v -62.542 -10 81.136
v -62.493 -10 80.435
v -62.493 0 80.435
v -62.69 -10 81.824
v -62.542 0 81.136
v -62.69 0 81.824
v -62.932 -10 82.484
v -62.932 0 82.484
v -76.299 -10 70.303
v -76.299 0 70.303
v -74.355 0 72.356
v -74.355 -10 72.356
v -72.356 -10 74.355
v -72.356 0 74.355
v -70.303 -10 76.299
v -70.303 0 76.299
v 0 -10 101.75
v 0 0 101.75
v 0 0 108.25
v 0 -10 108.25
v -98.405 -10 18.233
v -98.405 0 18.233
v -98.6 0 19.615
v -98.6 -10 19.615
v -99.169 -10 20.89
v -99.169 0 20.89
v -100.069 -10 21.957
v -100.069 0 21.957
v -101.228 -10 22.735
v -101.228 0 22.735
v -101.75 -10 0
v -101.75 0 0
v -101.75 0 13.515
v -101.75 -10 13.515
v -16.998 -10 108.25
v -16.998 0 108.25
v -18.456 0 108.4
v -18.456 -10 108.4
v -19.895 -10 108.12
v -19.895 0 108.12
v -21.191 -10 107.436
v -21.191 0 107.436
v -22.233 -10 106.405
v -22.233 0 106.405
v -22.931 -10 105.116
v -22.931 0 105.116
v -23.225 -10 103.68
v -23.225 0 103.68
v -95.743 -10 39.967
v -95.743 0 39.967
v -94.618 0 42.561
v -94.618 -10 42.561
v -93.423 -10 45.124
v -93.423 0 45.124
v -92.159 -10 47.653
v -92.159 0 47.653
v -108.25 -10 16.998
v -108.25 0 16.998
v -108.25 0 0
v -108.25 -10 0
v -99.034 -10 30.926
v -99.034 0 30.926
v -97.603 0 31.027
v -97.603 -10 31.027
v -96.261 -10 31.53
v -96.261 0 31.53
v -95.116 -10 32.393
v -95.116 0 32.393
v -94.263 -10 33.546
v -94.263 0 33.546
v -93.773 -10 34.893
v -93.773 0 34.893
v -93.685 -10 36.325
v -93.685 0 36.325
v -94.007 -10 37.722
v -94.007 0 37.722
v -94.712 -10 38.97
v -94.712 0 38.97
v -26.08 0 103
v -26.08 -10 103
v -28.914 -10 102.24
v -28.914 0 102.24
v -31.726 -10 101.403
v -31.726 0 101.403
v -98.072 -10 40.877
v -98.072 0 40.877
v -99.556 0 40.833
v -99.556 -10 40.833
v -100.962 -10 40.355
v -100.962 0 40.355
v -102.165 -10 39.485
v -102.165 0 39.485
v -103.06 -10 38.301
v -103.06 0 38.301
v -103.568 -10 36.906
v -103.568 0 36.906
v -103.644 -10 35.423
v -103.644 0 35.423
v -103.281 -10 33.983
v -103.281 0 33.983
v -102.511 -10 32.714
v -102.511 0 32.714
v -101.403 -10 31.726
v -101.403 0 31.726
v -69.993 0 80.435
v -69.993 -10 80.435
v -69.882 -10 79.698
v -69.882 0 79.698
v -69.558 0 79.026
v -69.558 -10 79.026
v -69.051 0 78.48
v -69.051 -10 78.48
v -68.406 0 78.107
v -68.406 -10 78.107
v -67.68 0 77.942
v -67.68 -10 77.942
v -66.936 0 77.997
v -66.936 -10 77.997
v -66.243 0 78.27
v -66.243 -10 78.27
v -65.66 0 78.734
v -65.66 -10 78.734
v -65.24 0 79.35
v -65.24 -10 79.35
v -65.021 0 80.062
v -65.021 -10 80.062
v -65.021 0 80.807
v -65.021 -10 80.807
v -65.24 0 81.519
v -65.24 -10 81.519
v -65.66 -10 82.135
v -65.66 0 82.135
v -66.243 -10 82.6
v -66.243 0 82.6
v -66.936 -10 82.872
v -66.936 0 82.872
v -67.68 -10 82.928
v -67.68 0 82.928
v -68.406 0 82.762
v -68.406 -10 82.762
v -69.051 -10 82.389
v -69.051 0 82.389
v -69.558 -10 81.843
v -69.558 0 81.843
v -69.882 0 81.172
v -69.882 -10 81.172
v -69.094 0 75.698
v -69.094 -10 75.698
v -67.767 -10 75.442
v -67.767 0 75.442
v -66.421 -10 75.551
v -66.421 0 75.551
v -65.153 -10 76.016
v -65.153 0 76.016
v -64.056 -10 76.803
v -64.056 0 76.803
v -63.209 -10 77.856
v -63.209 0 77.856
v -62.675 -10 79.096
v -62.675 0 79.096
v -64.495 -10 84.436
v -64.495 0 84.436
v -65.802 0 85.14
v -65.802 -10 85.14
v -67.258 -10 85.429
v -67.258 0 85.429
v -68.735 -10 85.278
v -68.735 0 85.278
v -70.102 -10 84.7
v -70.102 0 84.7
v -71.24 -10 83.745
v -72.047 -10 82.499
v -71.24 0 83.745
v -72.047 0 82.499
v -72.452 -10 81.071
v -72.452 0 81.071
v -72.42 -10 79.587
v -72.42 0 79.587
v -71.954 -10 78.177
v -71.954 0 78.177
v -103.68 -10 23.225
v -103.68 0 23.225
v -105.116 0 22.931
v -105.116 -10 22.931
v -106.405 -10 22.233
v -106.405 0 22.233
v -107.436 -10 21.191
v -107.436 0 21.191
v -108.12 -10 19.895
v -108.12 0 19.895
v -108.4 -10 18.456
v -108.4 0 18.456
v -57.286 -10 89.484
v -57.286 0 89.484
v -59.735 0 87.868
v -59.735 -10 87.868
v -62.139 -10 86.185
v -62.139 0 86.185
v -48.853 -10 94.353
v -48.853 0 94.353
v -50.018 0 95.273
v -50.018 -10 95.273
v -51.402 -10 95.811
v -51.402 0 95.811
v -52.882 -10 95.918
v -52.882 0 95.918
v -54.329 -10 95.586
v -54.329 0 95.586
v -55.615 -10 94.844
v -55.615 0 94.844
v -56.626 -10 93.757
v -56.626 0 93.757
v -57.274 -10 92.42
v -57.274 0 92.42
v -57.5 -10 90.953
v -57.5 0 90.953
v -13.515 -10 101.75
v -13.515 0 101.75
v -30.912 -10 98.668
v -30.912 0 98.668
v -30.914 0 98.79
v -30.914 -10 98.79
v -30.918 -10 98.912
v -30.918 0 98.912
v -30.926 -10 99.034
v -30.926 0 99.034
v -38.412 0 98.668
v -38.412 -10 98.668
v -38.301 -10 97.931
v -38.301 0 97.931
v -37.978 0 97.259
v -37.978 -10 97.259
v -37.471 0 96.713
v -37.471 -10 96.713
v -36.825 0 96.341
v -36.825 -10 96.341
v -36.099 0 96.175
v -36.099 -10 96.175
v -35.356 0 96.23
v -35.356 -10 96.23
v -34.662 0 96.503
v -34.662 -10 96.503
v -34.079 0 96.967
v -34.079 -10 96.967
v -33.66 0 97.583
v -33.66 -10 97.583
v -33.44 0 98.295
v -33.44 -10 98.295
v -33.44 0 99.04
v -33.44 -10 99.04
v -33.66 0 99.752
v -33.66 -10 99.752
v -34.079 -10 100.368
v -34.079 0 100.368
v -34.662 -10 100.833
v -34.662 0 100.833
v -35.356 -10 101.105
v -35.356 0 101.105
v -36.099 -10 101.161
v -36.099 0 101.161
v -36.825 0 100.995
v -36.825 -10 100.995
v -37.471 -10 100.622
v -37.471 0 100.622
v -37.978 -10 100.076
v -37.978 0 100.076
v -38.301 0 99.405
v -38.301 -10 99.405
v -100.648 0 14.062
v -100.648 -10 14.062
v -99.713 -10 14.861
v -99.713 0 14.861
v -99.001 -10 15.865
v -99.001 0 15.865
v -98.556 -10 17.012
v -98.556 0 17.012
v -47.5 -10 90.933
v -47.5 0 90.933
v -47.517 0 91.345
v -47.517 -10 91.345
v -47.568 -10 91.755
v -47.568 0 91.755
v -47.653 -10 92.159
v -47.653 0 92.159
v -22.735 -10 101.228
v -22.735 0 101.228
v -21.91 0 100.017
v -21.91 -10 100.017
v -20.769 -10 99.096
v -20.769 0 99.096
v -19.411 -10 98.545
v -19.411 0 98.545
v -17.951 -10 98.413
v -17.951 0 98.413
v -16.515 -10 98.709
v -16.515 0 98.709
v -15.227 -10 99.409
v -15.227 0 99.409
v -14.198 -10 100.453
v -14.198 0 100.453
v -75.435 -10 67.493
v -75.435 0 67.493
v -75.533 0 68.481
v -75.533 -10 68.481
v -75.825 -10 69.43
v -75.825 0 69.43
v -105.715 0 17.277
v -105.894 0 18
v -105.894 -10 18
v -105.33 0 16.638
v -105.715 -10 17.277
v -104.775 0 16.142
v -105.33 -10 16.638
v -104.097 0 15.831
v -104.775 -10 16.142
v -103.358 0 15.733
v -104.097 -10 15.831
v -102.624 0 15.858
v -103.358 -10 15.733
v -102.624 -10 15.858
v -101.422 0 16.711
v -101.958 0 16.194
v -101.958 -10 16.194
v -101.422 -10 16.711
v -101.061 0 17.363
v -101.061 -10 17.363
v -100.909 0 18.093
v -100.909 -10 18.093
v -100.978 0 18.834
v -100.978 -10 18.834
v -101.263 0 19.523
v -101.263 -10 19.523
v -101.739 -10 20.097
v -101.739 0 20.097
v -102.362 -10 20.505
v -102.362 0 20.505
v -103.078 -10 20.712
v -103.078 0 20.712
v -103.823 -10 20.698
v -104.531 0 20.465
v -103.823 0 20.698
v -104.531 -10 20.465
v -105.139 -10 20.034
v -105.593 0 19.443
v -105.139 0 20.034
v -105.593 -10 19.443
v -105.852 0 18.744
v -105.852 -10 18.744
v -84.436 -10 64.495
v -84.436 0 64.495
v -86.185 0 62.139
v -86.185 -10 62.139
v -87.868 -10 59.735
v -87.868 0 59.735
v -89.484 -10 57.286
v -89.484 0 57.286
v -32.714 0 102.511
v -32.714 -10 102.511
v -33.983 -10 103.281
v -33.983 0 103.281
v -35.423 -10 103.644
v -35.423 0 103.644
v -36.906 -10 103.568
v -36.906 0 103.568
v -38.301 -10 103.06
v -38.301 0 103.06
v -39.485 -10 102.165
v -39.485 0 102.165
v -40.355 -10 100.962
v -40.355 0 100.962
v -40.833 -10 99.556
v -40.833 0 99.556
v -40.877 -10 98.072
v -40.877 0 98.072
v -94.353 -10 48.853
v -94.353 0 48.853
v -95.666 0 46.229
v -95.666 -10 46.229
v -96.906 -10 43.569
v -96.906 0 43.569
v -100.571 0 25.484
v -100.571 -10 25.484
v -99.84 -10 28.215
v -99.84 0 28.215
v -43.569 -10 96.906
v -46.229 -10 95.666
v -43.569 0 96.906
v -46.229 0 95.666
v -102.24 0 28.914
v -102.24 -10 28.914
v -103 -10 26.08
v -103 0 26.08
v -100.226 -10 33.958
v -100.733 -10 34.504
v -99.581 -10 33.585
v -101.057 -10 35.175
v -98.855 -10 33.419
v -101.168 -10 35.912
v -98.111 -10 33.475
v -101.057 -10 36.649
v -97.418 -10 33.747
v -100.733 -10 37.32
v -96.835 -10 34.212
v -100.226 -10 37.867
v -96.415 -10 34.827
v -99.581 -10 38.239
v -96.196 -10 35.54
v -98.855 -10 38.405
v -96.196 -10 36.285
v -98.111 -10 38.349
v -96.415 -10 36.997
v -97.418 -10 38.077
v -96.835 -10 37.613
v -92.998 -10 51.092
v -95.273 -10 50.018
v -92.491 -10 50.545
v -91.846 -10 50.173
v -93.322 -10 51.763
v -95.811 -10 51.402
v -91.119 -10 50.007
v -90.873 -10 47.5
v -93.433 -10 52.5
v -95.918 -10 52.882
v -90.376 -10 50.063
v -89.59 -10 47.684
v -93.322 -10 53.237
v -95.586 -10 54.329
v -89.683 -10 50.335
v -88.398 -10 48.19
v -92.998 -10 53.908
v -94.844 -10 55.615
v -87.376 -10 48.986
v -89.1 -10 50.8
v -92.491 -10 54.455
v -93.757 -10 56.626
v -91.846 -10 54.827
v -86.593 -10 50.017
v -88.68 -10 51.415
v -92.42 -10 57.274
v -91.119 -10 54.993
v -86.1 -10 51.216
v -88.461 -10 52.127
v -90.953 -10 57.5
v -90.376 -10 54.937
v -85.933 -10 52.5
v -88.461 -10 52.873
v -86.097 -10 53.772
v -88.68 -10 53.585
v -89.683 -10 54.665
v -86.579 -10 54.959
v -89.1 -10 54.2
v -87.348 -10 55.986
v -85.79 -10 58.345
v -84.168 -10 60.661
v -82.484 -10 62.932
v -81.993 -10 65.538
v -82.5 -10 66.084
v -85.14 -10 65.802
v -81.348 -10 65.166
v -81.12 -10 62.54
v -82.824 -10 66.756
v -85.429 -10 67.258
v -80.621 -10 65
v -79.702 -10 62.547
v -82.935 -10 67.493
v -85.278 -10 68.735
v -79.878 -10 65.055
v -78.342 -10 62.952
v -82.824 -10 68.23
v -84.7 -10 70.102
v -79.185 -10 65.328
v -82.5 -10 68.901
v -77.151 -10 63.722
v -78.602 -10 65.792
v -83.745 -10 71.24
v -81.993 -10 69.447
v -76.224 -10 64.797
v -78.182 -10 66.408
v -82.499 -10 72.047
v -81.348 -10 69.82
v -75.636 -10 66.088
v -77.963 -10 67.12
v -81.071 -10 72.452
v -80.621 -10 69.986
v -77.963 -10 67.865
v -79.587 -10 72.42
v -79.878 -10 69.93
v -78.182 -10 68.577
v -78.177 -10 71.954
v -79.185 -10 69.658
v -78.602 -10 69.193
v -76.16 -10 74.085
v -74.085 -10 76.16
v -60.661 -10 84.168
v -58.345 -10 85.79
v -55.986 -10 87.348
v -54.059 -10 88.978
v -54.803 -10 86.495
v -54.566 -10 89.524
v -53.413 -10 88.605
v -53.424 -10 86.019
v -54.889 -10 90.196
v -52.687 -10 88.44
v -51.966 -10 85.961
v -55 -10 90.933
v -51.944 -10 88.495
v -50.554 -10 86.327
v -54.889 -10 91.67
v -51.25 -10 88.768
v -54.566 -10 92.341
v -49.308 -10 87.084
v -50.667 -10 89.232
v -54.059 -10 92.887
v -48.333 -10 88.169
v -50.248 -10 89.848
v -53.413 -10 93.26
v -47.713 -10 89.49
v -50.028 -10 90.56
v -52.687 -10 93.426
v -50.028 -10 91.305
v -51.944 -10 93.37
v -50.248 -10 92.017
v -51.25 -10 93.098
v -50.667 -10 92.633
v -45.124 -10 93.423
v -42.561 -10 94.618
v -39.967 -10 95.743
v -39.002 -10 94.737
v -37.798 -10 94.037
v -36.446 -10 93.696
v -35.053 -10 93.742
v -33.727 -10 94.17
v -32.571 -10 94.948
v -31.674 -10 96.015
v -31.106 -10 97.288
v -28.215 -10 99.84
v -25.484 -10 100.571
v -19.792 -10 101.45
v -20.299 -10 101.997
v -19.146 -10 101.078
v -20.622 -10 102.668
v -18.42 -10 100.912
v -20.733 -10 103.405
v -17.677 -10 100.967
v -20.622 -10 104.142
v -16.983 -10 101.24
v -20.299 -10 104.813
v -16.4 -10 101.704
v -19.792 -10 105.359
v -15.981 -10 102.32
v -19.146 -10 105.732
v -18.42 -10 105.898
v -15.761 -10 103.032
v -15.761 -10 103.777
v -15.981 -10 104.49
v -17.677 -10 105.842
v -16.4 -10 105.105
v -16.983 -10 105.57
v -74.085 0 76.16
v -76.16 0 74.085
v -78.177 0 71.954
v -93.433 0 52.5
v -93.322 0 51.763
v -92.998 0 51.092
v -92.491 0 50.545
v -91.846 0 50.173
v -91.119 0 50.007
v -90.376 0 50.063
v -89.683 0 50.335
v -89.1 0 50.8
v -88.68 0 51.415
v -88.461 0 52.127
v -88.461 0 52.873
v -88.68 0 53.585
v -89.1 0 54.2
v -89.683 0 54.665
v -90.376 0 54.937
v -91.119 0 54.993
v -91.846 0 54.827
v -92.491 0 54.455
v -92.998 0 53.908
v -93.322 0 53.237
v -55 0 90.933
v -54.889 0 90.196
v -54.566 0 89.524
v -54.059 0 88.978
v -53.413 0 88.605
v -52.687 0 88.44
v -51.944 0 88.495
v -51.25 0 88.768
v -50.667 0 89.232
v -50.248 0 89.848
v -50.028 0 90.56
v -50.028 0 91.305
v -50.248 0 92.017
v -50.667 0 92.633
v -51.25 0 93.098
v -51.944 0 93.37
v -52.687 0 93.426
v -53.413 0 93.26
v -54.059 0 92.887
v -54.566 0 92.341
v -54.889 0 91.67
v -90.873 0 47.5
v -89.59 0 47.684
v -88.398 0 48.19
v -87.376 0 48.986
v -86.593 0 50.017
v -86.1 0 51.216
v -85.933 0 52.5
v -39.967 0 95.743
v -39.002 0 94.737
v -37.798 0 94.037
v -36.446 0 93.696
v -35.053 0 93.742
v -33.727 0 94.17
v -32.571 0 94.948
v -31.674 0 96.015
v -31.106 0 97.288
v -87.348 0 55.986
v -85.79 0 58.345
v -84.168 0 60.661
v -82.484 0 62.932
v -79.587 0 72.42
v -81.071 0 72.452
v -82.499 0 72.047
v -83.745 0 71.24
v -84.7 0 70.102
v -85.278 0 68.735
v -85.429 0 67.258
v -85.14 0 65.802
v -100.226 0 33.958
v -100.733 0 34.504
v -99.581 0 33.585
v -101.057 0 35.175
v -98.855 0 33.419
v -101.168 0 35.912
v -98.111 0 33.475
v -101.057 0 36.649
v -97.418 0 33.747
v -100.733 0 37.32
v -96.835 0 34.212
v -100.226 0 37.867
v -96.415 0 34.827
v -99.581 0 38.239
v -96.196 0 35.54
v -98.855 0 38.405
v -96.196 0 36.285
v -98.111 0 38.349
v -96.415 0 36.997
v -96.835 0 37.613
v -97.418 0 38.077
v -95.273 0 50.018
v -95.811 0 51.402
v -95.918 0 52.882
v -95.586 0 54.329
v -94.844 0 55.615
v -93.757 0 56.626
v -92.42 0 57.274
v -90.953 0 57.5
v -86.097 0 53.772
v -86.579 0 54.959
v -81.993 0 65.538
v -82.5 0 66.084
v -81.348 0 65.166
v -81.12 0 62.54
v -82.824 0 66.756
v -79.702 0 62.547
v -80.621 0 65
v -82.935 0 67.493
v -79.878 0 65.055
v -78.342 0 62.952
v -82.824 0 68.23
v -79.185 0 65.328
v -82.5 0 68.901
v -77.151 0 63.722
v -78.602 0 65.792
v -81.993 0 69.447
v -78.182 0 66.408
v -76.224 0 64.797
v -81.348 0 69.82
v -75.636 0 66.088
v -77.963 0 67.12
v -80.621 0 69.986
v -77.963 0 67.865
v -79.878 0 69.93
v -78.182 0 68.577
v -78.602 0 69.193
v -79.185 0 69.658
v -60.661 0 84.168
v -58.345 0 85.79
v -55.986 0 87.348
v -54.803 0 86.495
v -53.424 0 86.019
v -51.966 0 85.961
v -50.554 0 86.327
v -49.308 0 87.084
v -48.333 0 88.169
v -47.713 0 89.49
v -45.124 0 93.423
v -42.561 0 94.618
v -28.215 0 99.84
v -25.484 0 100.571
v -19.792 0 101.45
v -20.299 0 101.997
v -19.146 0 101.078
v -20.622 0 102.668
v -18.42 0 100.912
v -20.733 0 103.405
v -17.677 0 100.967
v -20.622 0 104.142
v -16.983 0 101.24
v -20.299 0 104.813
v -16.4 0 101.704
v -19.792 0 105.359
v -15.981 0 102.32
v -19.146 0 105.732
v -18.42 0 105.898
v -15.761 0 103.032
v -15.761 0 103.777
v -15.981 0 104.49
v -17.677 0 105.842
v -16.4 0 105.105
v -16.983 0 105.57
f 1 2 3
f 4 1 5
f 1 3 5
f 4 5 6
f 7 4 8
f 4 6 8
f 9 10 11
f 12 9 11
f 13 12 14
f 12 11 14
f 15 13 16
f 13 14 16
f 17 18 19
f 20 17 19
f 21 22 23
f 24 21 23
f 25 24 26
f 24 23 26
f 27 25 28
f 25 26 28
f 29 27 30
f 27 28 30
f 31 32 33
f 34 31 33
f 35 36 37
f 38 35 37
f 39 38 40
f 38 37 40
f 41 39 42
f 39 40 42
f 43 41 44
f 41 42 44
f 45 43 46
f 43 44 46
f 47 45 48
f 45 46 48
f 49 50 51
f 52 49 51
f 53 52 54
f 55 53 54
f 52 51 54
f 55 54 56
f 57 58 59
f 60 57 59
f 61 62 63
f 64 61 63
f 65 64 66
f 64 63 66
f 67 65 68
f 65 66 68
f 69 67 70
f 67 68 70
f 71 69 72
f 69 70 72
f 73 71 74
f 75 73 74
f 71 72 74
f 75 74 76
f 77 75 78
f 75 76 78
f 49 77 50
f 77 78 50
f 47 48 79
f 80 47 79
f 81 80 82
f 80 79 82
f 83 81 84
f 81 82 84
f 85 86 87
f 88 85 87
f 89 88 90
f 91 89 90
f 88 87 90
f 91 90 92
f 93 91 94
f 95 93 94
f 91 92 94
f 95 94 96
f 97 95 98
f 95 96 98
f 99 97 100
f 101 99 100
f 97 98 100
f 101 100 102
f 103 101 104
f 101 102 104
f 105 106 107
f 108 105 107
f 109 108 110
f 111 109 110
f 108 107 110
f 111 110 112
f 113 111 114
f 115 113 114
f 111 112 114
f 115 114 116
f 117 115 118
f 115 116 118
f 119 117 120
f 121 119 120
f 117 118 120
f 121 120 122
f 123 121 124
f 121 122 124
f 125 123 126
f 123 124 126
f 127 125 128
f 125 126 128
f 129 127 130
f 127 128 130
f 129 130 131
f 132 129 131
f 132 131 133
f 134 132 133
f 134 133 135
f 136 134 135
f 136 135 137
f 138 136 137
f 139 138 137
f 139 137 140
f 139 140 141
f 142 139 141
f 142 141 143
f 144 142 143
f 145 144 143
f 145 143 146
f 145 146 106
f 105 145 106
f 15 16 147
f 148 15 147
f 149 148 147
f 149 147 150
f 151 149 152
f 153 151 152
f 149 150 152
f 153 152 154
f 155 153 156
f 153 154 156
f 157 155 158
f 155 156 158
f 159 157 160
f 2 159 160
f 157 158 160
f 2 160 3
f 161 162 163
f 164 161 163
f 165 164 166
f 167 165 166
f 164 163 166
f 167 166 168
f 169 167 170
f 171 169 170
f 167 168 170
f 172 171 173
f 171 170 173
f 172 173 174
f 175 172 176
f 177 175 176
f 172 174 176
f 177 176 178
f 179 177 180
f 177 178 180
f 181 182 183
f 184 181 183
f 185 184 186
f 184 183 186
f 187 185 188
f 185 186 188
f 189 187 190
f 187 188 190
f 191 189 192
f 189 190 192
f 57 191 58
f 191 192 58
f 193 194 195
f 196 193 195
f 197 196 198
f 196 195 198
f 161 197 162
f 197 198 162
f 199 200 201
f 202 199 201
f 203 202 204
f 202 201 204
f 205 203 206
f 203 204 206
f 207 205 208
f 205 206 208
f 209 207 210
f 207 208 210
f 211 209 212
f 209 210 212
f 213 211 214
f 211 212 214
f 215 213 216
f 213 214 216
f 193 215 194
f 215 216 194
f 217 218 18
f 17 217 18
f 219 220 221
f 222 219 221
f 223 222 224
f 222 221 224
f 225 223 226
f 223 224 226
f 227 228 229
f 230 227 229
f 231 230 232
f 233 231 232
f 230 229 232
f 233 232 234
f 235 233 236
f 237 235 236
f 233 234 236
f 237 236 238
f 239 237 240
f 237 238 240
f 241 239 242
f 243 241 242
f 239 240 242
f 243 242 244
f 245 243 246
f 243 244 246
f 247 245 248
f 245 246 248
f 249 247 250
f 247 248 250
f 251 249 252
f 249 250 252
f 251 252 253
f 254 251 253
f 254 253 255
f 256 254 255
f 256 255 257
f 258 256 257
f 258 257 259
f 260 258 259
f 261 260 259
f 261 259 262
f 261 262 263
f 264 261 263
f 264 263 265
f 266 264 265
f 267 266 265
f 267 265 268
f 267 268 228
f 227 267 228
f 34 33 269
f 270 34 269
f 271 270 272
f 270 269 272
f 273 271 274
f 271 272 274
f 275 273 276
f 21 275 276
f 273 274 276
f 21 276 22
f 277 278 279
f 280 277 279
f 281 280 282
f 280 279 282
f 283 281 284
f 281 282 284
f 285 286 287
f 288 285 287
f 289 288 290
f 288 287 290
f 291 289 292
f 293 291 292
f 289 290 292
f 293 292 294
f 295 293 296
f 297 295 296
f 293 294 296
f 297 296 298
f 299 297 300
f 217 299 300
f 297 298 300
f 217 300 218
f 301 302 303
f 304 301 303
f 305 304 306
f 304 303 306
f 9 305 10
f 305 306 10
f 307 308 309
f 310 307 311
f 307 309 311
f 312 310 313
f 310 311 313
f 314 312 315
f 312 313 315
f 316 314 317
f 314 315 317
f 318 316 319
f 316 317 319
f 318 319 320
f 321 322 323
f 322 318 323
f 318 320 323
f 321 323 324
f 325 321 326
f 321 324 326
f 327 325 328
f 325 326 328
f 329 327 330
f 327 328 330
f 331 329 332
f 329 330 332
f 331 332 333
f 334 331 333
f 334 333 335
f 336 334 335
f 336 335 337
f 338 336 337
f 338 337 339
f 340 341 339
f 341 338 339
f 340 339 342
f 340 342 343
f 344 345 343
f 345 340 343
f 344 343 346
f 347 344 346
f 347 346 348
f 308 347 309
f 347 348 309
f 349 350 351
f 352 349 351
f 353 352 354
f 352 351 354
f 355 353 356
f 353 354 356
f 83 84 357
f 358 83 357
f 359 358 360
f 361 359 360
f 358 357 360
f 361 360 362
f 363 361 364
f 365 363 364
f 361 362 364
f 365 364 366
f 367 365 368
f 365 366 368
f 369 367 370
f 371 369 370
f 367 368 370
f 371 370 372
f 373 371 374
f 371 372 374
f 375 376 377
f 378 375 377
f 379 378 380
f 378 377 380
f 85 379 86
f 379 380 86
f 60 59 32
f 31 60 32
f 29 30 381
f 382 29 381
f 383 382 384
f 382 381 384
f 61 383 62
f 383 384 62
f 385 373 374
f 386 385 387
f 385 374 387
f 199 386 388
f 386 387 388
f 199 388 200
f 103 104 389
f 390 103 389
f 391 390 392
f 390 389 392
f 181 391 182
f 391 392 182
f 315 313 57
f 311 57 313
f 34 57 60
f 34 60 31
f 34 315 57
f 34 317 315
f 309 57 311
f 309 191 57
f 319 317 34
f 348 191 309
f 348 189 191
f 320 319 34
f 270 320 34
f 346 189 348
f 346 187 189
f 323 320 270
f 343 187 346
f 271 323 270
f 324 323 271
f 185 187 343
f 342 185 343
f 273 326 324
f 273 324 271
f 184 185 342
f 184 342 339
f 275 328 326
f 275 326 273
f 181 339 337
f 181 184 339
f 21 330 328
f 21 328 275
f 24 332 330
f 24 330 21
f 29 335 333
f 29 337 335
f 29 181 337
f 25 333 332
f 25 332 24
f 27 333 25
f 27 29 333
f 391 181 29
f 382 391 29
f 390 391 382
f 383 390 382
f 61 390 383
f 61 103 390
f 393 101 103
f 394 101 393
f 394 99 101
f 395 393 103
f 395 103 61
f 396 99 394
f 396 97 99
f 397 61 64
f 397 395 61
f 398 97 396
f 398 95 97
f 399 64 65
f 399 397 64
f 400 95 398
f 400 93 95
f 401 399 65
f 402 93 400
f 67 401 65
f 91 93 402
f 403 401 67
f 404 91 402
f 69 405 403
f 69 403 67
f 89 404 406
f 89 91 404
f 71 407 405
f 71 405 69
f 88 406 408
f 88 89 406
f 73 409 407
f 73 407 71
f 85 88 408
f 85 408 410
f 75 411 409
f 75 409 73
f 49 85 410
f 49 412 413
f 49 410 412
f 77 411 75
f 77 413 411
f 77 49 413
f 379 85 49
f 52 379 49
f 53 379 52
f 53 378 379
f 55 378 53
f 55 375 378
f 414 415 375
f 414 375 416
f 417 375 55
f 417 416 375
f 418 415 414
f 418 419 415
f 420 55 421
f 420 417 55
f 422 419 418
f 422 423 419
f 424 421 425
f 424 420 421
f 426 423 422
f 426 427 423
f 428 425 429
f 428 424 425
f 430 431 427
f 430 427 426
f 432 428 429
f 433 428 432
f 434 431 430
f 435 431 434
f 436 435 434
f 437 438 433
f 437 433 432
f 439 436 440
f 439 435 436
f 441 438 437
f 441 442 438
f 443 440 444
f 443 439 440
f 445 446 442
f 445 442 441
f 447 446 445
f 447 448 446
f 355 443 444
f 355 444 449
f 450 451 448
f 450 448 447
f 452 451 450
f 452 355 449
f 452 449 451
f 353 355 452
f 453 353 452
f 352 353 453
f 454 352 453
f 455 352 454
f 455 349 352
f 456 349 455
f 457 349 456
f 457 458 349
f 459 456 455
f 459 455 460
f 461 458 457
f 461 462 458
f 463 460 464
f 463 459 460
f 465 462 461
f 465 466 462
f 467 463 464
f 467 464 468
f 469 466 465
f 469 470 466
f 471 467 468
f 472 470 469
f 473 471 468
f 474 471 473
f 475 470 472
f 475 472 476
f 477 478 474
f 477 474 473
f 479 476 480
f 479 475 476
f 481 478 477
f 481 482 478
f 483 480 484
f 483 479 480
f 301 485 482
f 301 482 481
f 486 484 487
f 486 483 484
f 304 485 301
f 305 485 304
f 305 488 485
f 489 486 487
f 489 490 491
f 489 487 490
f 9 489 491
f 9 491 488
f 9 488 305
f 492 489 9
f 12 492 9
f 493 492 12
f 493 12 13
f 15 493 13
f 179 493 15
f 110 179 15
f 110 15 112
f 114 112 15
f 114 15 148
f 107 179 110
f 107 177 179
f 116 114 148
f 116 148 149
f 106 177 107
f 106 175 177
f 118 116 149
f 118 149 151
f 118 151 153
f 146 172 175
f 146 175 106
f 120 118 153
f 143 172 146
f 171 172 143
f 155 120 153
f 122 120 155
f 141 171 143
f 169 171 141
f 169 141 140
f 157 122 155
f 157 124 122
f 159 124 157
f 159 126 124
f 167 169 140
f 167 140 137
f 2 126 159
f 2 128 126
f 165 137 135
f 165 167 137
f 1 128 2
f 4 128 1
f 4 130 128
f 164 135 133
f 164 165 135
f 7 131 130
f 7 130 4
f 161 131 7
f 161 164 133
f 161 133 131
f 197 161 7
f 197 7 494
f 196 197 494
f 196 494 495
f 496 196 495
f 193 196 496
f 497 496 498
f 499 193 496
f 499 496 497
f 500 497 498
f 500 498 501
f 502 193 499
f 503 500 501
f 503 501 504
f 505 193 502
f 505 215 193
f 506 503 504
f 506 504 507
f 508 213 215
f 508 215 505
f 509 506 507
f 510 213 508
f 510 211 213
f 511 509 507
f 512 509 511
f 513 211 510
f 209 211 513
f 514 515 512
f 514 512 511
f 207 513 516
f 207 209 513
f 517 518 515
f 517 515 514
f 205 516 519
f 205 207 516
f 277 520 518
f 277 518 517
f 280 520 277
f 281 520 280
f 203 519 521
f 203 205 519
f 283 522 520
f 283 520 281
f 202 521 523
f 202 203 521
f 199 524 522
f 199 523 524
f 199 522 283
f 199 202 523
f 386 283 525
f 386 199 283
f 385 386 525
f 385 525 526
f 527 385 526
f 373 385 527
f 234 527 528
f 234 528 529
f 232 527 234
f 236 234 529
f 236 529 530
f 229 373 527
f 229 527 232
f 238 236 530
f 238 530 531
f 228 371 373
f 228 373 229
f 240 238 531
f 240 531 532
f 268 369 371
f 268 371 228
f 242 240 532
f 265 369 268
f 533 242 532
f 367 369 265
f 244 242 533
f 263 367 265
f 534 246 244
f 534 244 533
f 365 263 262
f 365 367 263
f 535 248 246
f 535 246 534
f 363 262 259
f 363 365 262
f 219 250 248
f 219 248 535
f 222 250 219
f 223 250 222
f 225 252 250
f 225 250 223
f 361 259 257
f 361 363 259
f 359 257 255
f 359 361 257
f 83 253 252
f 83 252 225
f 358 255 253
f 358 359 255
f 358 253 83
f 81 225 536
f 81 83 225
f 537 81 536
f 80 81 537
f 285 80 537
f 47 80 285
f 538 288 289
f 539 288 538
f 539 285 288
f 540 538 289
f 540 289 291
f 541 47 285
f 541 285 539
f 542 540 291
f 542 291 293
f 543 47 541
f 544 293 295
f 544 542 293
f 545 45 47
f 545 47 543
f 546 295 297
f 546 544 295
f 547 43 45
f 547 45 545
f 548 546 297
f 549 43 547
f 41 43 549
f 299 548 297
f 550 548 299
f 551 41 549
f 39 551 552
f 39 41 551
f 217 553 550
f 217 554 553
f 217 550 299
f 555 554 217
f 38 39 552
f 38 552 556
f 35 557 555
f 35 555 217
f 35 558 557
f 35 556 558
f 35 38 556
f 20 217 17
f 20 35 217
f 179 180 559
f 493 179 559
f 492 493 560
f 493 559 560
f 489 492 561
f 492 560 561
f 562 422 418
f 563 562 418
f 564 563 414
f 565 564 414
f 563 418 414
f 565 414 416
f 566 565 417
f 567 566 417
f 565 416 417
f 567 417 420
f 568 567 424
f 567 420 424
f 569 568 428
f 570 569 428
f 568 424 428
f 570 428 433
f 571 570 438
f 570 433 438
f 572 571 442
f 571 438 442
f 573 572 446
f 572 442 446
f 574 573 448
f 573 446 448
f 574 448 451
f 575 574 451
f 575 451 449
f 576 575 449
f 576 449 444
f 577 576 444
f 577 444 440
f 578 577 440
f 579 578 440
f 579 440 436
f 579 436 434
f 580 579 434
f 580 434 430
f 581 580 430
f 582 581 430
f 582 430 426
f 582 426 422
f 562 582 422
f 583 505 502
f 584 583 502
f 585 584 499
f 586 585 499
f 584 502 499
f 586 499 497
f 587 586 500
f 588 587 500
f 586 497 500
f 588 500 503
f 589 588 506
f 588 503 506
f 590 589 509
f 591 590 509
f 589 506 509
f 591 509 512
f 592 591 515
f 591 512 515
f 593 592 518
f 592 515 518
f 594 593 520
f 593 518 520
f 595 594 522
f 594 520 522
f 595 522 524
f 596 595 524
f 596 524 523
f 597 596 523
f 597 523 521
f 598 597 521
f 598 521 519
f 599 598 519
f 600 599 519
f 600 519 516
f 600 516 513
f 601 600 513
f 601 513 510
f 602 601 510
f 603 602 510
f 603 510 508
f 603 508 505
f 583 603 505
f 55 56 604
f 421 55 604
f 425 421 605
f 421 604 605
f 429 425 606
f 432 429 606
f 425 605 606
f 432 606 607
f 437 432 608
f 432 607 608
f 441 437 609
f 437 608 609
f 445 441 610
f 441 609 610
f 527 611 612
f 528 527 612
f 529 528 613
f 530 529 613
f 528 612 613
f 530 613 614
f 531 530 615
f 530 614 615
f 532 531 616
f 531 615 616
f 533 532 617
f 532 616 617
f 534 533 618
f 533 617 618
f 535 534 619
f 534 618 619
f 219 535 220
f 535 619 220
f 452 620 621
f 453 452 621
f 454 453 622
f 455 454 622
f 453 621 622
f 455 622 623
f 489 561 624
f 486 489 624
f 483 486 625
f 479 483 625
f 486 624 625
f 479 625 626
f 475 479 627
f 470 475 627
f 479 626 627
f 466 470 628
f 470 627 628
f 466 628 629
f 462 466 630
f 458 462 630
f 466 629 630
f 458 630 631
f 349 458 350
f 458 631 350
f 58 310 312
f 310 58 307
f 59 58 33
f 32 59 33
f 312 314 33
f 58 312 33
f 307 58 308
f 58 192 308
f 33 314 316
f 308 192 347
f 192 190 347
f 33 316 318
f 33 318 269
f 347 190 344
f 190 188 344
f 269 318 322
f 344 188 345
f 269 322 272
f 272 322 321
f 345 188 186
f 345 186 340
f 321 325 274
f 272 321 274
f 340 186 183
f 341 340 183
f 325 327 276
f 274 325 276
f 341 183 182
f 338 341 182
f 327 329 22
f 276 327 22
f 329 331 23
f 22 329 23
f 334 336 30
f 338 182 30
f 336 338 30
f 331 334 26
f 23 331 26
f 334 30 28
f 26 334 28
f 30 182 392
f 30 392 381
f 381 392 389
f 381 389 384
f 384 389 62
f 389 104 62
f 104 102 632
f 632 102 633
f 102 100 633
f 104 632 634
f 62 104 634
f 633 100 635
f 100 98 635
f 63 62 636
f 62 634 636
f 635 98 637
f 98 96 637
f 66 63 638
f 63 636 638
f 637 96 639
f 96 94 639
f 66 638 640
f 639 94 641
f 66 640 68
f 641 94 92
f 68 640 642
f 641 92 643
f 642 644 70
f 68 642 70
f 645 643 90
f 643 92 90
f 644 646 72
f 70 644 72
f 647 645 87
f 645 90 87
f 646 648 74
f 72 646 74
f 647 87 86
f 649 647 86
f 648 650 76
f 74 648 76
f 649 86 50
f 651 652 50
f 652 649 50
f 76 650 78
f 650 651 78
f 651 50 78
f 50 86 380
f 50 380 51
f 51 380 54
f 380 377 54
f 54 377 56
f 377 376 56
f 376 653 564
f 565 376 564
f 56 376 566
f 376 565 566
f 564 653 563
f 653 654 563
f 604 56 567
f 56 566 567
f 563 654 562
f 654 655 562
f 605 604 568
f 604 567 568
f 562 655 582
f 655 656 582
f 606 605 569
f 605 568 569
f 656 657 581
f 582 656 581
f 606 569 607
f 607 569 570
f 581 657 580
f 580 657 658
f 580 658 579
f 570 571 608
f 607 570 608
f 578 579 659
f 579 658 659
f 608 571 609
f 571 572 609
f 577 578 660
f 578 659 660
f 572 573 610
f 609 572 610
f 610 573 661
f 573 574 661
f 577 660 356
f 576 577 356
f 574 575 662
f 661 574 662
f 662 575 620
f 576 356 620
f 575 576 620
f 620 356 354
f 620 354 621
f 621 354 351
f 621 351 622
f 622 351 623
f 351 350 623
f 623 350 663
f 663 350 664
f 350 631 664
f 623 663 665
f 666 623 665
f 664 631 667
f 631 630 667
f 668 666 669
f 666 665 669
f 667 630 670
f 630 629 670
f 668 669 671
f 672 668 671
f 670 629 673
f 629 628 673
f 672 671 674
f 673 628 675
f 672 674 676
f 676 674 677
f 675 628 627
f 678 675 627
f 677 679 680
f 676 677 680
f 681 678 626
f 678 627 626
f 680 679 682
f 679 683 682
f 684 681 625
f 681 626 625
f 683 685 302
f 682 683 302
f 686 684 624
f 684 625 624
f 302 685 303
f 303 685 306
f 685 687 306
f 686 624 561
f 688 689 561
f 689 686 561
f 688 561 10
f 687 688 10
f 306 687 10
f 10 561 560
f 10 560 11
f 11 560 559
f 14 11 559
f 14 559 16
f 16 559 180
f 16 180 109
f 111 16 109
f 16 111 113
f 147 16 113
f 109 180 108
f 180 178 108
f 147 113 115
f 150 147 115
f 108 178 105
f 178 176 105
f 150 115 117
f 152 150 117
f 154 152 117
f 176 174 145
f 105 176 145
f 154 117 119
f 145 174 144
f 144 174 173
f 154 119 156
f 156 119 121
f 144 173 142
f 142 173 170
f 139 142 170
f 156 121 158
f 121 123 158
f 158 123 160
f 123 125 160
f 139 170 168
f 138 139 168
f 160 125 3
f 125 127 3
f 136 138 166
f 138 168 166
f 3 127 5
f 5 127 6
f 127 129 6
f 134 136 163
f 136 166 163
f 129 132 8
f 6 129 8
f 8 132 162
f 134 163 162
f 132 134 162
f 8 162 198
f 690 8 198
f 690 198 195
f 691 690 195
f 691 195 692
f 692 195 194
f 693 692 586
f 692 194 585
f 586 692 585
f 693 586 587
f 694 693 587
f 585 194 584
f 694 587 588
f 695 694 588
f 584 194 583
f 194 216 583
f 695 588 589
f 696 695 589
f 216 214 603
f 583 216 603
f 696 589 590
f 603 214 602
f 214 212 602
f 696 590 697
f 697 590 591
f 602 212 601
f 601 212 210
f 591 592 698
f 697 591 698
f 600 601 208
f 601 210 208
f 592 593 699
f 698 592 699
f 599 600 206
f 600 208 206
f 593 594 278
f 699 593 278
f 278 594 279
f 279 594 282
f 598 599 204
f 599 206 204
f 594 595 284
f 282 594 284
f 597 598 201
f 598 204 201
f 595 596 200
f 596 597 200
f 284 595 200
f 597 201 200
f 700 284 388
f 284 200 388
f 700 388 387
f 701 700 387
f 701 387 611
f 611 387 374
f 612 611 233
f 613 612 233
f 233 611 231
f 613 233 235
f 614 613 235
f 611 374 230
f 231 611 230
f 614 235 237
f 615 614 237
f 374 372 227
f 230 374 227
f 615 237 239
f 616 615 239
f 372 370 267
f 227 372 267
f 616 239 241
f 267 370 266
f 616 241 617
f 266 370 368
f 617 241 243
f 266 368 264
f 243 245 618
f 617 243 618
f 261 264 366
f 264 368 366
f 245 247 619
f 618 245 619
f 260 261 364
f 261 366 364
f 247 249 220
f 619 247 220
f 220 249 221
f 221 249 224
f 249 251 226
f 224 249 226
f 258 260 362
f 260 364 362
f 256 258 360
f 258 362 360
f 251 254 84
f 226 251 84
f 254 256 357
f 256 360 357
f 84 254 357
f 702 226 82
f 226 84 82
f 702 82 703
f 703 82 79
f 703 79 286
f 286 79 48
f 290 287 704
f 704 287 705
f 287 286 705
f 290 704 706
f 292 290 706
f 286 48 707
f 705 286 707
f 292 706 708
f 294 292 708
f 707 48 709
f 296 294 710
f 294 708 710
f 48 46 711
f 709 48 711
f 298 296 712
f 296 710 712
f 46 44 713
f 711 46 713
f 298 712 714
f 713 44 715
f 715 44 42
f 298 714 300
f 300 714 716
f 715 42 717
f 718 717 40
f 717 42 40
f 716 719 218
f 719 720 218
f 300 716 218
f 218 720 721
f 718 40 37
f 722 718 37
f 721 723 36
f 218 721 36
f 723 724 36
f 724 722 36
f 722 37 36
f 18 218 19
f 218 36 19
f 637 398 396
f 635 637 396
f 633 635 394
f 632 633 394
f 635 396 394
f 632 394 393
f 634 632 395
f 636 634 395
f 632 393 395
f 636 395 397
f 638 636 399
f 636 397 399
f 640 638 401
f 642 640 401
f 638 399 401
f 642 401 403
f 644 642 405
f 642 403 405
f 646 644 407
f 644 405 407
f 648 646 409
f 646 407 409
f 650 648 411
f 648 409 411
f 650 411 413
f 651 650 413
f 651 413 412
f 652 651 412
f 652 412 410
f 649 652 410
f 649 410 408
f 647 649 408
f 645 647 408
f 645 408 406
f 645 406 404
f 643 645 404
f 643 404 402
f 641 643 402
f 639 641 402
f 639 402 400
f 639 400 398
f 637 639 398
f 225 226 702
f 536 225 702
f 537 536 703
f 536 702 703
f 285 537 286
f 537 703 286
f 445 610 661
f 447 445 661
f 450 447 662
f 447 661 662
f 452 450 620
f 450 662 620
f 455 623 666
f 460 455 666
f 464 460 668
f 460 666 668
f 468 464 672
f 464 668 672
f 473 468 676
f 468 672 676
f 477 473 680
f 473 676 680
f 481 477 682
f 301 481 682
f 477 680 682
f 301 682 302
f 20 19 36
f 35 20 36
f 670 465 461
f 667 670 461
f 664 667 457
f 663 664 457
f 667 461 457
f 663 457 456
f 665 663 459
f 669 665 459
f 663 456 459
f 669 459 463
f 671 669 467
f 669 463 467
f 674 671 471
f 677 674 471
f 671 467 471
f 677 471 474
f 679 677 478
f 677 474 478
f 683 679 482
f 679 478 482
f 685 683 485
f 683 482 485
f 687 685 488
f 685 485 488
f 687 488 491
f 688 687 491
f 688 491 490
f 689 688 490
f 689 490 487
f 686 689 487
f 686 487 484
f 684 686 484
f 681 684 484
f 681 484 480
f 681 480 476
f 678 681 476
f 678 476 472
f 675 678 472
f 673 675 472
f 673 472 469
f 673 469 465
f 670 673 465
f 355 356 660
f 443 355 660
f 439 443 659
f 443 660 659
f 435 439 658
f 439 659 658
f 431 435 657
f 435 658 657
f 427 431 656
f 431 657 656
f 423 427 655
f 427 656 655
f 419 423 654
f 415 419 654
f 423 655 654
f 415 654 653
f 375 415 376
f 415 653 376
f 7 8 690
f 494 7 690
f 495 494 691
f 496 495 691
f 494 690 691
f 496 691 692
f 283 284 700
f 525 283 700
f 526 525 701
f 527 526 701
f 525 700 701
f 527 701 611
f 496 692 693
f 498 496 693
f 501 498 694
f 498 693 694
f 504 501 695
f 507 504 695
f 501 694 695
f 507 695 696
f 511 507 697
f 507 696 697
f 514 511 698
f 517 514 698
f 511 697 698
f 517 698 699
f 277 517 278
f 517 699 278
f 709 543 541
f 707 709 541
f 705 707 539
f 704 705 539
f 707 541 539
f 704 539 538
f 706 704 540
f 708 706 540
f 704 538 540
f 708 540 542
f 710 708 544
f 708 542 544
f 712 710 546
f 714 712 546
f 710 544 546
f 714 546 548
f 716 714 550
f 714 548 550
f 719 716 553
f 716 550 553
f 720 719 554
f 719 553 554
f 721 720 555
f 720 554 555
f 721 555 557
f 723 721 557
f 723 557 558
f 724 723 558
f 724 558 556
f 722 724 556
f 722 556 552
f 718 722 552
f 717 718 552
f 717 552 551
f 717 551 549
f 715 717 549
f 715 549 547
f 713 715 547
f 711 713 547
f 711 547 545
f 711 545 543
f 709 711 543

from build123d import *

# Parameters (mm, degrees)
F1_DEPTH = 10
F2_D     = 5
F2_DEPTH = 25
F2_TIP   = 1.5021515476
F3_DEPTH = 10
F4_D     = 5
F4_DEPTH = 25
F4_TIP   = 1.5021515476


with BuildPart() as f1:
    # F0 (on Front) → F1 (new body)
    with BuildSketch(Plane.XZ):
        with BuildLine():
            ThreePointArc((-104.7141943578, 18), (-104.2300860658, 20.6192060639), (-103.6804744694, 23.2254540062))
            ThreePointArc((-103.6804744694, 23.2254540062), (-107.4358876221, 21.1911739312), (-108.25, 16.998484531))
            Line((-108.25, 16.998484531), (-108.25, 18))
            Line((-108.25, 18), (-104.7141943578, 18))
        make_face()
        with BuildLine():
            ThreePointArc((-101.75, 13.5148396684), (-99.325961879, 15.3411795368), (-98.4048140663, 18.233058655))
            ThreePointArc((-98.4048140663, 18.233058655), (-99.1691476023, 20.8899609125), (-101.2284659086, 22.7345593711))
            ThreePointArc((-101.2284659086, 22.7345593711), (-101.7300922405, 20.37279639), (-102.176624039, 18))
            Line((-102.176624039, 18), (-101.75, 18))
            Line((-101.75, 18), (-101.75, 13.5148396684))
        make_face()
        with BuildLine():
            ThreePointArc((-103.6804744694, 23.2254540062), (-102.4232857321, 23.1357724065), (-101.2284659086, 22.7345593711))
            ThreePointArc((-101.2284659086, 22.7345593711), (-100.2148044775, 26.8524759294), (-99.0337027485, 30.9255269951))
            ThreePointArc((-99.0337027485, 30.9255269951), (-100.2690535864, 31.1754762258), (-101.40265177, 31.7264040509))
            ThreePointArc((-101.40265177, 31.7264040509), (-102.6296190432, 27.4995235421), (-103.6804744694, 23.2254540062))
        make_face()
        with BuildLine():
            ThreePointArc((-102.176624039, 18), (-101.7300922405, 20.37279639), (-101.2284659086, 22.7345593711))
            ThreePointArc((-101.2284659086, 22.7345593711), (-102.4232857321, 23.1357724065), (-103.6804744694, 23.2254540062))
            ThreePointArc((-103.6804744694, 23.2254540062), (-104.2300860658, 20.6192060639), (-104.7141943578, 18))
            Line((-104.7141943578, 18), (-102.176624039, 18))
        make_face()
        with BuildLine():
            ThreePointArc((-98.0722773298, 40.8765326238), (-103.3661882864, 37.6222157658), (-101.40265177, 31.7264040509))
            ThreePointArc((-101.40265177, 31.7264040509), (-99.8423409585, 36.3396402284), (-98.0722773298, 40.8765326238))
        make_face()
        with BuildLine():
            ThreePointArc((-101.40265177, 31.7264040509), (-100.2690535864, 31.1754762258), (-99.0337027485, 30.9255269951))
            ThreePointArc((-99.0337027485, 30.9255269951), (-97.4931094065, 35.48458987), (-95.7427632475, 39.967308963))
            ThreePointArc((-95.7427632475, 39.967308963), (-96.8497611607, 40.5699049559), (-98.0722773298, 40.8765326238))
            ThreePointArc((-98.0722773298, 40.8765326238), (-99.8423409585, 36.3396402284), (-101.40265177, 31.7264040509))
        make_face()
        with BuildLine():
            ThreePointArc((-95.7427632475, 39.967308963), (-97.4931094065, 35.48458987), (-99.0337027485, 30.9255269951))
            ThreePointArc((-99.0337027485, 30.9255269951), (-95.2640424586, 32.2494733912), (-93.6677251825, 35.9121150492))
            ThreePointArc((-93.6677251825, 35.9121150492), (-94.2166124185, 38.1897443347), (-95.7427632475, 39.967308963))
        make_face()
        with BuildLine():
            Line((-18, 108.25), (-16.998484531, 108.25))
            ThreePointArc((-16.998484531, 108.25), (-21.1911739312, 107.4358876221), (-23.2254540062, 103.6804744694))
            ThreePointArc((-23.2254540062, 103.6804744694), (-20.6192060639, 104.2300860658), (-18, 104.7141943578))
            Line((-18, 104.7141943578), (-18, 108.25))
        make_face()
        with BuildLine():
            ThreePointArc((-22.7345593711, 101.2284659086), (-20.37279639, 101.7300922405), (-18, 102.176624039))
            Line((-18, 102.176624039), (-18, 104.7141943578))
            ThreePointArc((-18, 104.7141943578), (-20.6192060639, 104.2300860658), (-23.2254540062, 103.6804744694))
            ThreePointArc((-23.2254540062, 103.6804744694), (-23.1357724065, 102.4232857321), (-22.7345593711, 101.2284659086))
        make_face()
        with BuildLine():
            ThreePointArc((-22.7345593711, 101.2284659086), (-17.9506738921, 98.4127945505), (-13.5148396684, 101.75))
            Line((-13.5148396684, 101.75), (-18, 101.75))
            Line((-18, 101.75), (-18, 102.176624039))
            ThreePointArc((-18, 102.176624039), (-20.37279639, 101.7300922405), (-22.7345593711, 101.2284659086))
        make_face()
        with BuildLine():
            ThreePointArc((-30.9255269951, 99.0337027485), (-26.8524759294, 100.2148044775), (-22.7345593711, 101.2284659086))
            ThreePointArc((-22.7345593711, 101.2284659086), (-23.1357724065, 102.4232857321), (-23.2254540062, 103.6804744694))
            ThreePointArc((-23.2254540062, 103.6804744694), (-27.4995235421, 102.6296190432), (-31.7264040509, 101.40265177))
            ThreePointArc((-31.7264040509, 101.40265177), (-31.1754762258, 100.2690535864), (-30.9255269951, 99.0337027485))
        make_face()
        with BuildLine():
            ThreePointArc((-39.967308963, 95.7427632475), (-35.48458987, 97.4931094065), (-30.9255269951, 99.0337027485))
            ThreePointArc((-30.9255269951, 99.0337027485), (-31.1754762258, 100.2690535864), (-31.7264040509, 101.40265177))
            ThreePointArc((-31.7264040509, 101.40265177), (-36.3396402284, 99.8423409585), (-40.8765326238, 98.0722773298))
            ThreePointArc((-40.8765326238, 98.0722773298), (-40.5699049559, 96.8497611607), (-39.967308963, 95.7427632475))
        make_face()
        with BuildLine():
            ThreePointArc((-40.8765326238, 98.0722773298), (-36.3396402284, 99.8423409585), (-31.7264040509, 101.40265177))
            ThreePointArc((-31.7264040509, 101.40265177), (-37.6222157658, 103.3661882864), (-40.8765326238, 98.0722773298))
        make_face()
        with BuildLine():
            ThreePointArc((-30.9121150492, 98.6677251825), (-30.9154691607, 98.8508368009), (-30.9255269951, 99.0337027485))
            ThreePointArc((-30.9255269951, 99.0337027485), (-35.48458987, 97.4931094065), (-39.967308963, 95.7427632475))
            ThreePointArc((-39.967308963, 95.7427632475), (-34.3752301428, 93.9097860505), (-30.9121150492, 98.6677251825))
        make_face()
        with BuildLine():
            ThreePointArc((-47.6527207606, 92.1589968701), (-51.875, 89.8501356426), (-55.9856720965, 87.3479651732))
            ThreePointArc((-55.9856720965, 87.3479651732), (-50.5542816857, 86.3267820057), (-47.5, 90.9326673974))
            ThreePointArc((-47.5, 90.9326673974), (-47.5383270867, 91.5505686044), (-47.6527207606, 92.1589968701))
        make_face()
        with BuildLine():
            ThreePointArc((-48.852794375, 94.3528853918), (-48.1133891227, 93.3321767245), (-47.6527207606, 92.1589968701))
            ThreePointArc((-47.6527207606, 92.1589968701), (-43.8466446556, 94.0294329051), (-39.967308963, 95.7427632475))
            ThreePointArc((-39.967308963, 95.7427632475), (-40.5699049559, 96.8497611607), (-40.8765326238, 98.0722773298))
            ThreePointArc((-40.8765326238, 98.0722773298), (-44.9031903099, 96.2952023726), (-48.852794375, 94.3528853918))
        make_face()
        with BuildLine():
            ThreePointArc((-57.2855984821, 89.4842036705), (-56.7713414726, 88.3335056047), (-55.9856720965, 87.3479651732))
            ThreePointArc((-55.9856720965, 87.3479651732), (-51.875, 89.8501356426), (-47.6527207606, 92.1589968701))
            ThreePointArc((-47.6527207606, 92.1589968701), (-48.1133891227, 93.3321767245), (-48.852794375, 94.3528853918))
            ThreePointArc((-48.852794375, 94.3528853918), (-53.125, 92.0151991521), (-57.2855984821, 89.4842036705))
        make_face()
        with BuildLine():
            ThreePointArc((-48.852794375, 94.3528853918), (-55, 95.2627944163), (-57.2855984821, 89.4842036705))
            ThreePointArc((-57.2855984821, 89.4842036705), (-53.125, 92.0151991521), (-48.852794375, 94.3528853918))
        make_face()
        with BuildLine():
            ThreePointArc((-64.4948172627, 84.4362543357), (-63.5894010376, 83.5594489013), (-62.9320107193, 82.4840865066))
            ThreePointArc((-62.9320107193, 82.4840865066), (-59.5085552714, 84.987024595), (-55.9856720965, 87.3479651732))
            ThreePointArc((-55.9856720965, 87.3479651732), (-56.7713414726, 88.3335056047), (-57.2855984821, 89.4842036705))
            ThreePointArc((-57.2855984821, 89.4842036705), (-60.9424963623, 87.0349047057), (-64.4948172627, 84.4362543357))
        make_face()
        with BuildLine():
            ThreePointArc((-64.4948172627, 84.4362543357), (-70.7066370655, 84.2648887431), (-71.9540704185, 78.1771977639))
            ThreePointArc((-71.9540704185, 78.1771977639), (-68.2961835292, 81.3922220814), (-64.4948172627, 84.4362543357))
        make_face()
        with BuildLine():
            ThreePointArc((-62.9320107193, 82.4840865066), (-66.689214505, 79.4771109736), (-70.3029389135, 76.2991433774))
            ThreePointArc((-70.3029389135, 76.2991433774), (-65.152955386, 76.0158884452), (-62.4926990171, 80.4346665275))
            ThreePointArc((-62.4926990171, 80.4346665275), (-62.6037604059, 81.4826547219), (-62.9320107193, 82.4840865066))
        make_face()
        with BuildLine():
            ThreePointArc((-71.9540704185, 78.1771977639), (-71.2478095063, 77.1332811798), (-70.3029389135, 76.2991433774))
            ThreePointArc((-70.3029389135, 76.2991433774), (-66.689214505, 79.4771109736), (-62.9320107193, 82.4840865066))
            ThreePointArc((-62.9320107193, 82.4840865066), (-63.5894010376, 83.5594489013), (-64.4948172627, 84.4362543357))
            ThreePointArc((-64.4948172627, 84.4362543357), (-68.2961835292, 81.3922220814), (-71.9540704185, 78.1771977639))
        make_face()
        with BuildLine():
            ThreePointArc((-78.1771977639, 71.9540704185), (-77.1332811798, 71.2478095063), (-76.2991433774, 70.3029389135))
            ThreePointArc((-76.2991433774, 70.3029389135), (-73.3623285481, 73.3623285481), (-70.3029389135, 76.2991433774))
            ThreePointArc((-70.3029389135, 76.2991433774), (-71.2478095063, 77.1332811798), (-71.9540704185, 78.1771977639))
            ThreePointArc((-71.9540704185, 78.1771977639), (-75.1300955011, 75.1300955011), (-78.1771977639, 71.9540704185))
        make_face()
        with BuildLine():
            ThreePointArc((-84.4362543357, 64.4948172627), (-83.5594489013, 63.5894010376), (-82.4840865066, 62.9320107193))
            ThreePointArc((-82.4840865066, 62.9320107193), (-79.4771109736, 66.689214505), (-76.2991433774, 70.3029389135))
            ThreePointArc((-76.2991433774, 70.3029389135), (-77.1332811798, 71.2478095063), (-78.1771977639, 71.9540704185))
            ThreePointArc((-78.1771977639, 71.9540704185), (-81.3922220814, 68.2961835292), (-84.4362543357, 64.4948172627))
        make_face()
        with BuildLine():
            ThreePointArc((-76.2991433774, 70.3029389135), (-79.4771109736, 66.689214505), (-82.4840865066, 62.9320107193))
            ThreePointArc((-82.4840865066, 62.9320107193), (-77.7187044415, 63.2946578134), (-75.4346665275, 67.4926990171))
            ThreePointArc((-75.4346665275, 67.4926990171), (-75.6556699932, 68.9627983759), (-76.2991433774, 70.3029389135))
        make_face()
        with BuildLine():
            ThreePointArc((-78.1771977639, 71.9540704185), (-84.2648887431, 70.7066370655), (-84.4362543357, 64.4948172627))
            ThreePointArc((-84.4362543357, 64.4948172627), (-81.3922220814, 68.2961835292), (-78.1771977639, 71.9540704185))
        make_face()
        with BuildLine():
            ThreePointArc((-89.4842036705, 57.2855984821), (-88.3335056047, 56.7713414726), (-87.3479651732, 55.9856720965))
            ThreePointArc((-87.3479651732, 55.9856720965), (-84.987024595, 59.5085552714), (-82.4840865066, 62.9320107193))
            ThreePointArc((-82.4840865066, 62.9320107193), (-83.5594489013, 63.5894010376), (-84.4362543357, 64.4948172627))
            ThreePointArc((-84.4362543357, 64.4948172627), (-87.0349047057, 60.9424963623), (-89.4842036705, 57.2855984821))
        make_face()
        with BuildLine():
            ThreePointArc((-89.4842036705, 57.2855984821), (-95.2627944163, 55), (-94.3528853918, 48.852794375))
            ThreePointArc((-94.3528853918, 48.852794375), (-92.0151991521, 53.125), (-89.4842036705, 57.2855984821))
        make_face()
        with BuildLine():
            ThreePointArc((-94.3528853918, 48.852794375), (-93.3321767245, 48.1133891227), (-92.1589968701, 47.6527207606))
            ThreePointArc((-92.1589968701, 47.6527207606), (-89.8501356426, 51.875), (-87.3479651732, 55.9856720965))
            ThreePointArc((-87.3479651732, 55.9856720965), (-88.3335056047, 56.7713414726), (-89.4842036705, 57.2855984821))
            ThreePointArc((-89.4842036705, 57.2855984821), (-92.0151991521, 53.125), (-94.3528853918, 48.852794375))
        make_face()
        with BuildLine():
            ThreePointArc((-87.3479651732, 55.9856720965), (-89.8501356426, 51.875), (-92.1589968701, 47.6527207606))
            ThreePointArc((-92.1589968701, 47.6527207606), (-87.8611569679, 48.5546453034), (-85.9326673974, 52.5))
            ThreePointArc((-85.9326673974, 52.5), (-86.2999839892, 54.3810221795), (-87.3479651732, 55.9856720965))
        make_face()
        with BuildLine():
            ThreePointArc((-98.0722773298, 40.8765326238), (-96.8497611607, 40.5699049559), (-95.7427632475, 39.967308963))
            ThreePointArc((-95.7427632475, 39.967308963), (-94.0294329051, 43.8466446556), (-92.1589968701, 47.6527207606))
            ThreePointArc((-92.1589968701, 47.6527207606), (-93.3321767245, 48.1133891227), (-94.3528853918, 48.852794375))
            ThreePointArc((-94.3528853918, 48.852794375), (-96.2952023726, 44.9031903099), (-98.0722773298, 40.8765326238))
        make_face()
        with BuildLine():
            ThreePointArc((-18, 104.7141943578), (-15.8214238003, 105.0654322265), (-13.6360229941, 105.3713498865))
            ThreePointArc((-13.6360229941, 105.3713498865), (-14.9813552876, 107.2030274897), (-16.998484531, 108.25))
            Line((-16.998484531, 108.25), (-18, 108.25))
            Line((-18, 108.25), (-18, 104.7141943578))
        make_face()
        with BuildLine():
            ThreePointArc((-13.6360229941, 105.3713498865), (-6.8321509995, 106.0301099345), (0, 106.25))
            Line((0, 106.25), (0, 108.25))
            Line((0, 108.25), (-16.998484531, 108.25))
            ThreePointArc((-16.998484531, 108.25), (-14.9813552876, 107.2030274897), (-13.6360229941, 105.3713498865))
        make_face()
        with BuildLine():
            ThreePointArc((-13.2586767409, 102.8993196823), (-6.6429693271, 103.5371115037), (0, 103.75))
            Line((0, 103.75), (0, 106.25))
            ThreePointArc((0, 106.25), (-6.8321509995, 106.0301099345), (-13.6360229941, 105.3713498865))
            ThreePointArc((-13.6360229941, 105.3713498865), (-13.3348355943, 104.4085126504), (-13.233058655, 103.4048140663))
            ThreePointArc((-13.233058655, 103.4048140663), (-13.2394672835, 103.151742506), (-13.2586767409, 102.8993196823))
        make_face()
        with BuildLine():
            ThreePointArc((-13.5148396684, 101.75), (-13.3528064086, 102.3170925893), (-13.2586767409, 102.8993196823))
            ThreePointArc((-13.2586767409, 102.8993196823), (-15.6335149645, 102.5653728597), (-18, 102.176624039))
            Line((-18, 102.176624039), (-18, 101.75))
            Line((-18, 101.75), (-13.5148396684, 101.75))
        make_face()
        with BuildLine():
            ThreePointArc((-18, 102.176624039), (-15.6335149645, 102.5653728597), (-13.2586767409, 102.8993196823))
            ThreePointArc((-13.2586767409, 102.8993196823), (-13.2394672835, 103.151742506), (-13.233058655, 103.4048140663))
            ThreePointArc((-13.233058655, 103.4048140663), (-13.3348355943, 104.4085126504), (-13.6360229941, 105.3713498865))
            ThreePointArc((-13.6360229941, 105.3713498865), (-15.8214238003, 105.0654322265), (-18, 104.7141943578))
            Line((-18, 104.7141943578), (-18, 102.176624039))
        make_face()
        with BuildLine():
            Line((0, 101.75), (0, 103.75))
            ThreePointArc((0, 103.75), (-6.6429693271, 103.5371115037), (-13.2586767409, 102.8993196823))
            ThreePointArc((-13.2586767409, 102.8993196823), (-13.3528064086, 102.3170925893), (-13.5148396684, 101.75))
            Line((-13.5148396684, 101.75), (0, 101.75))
        make_face()
        with BuildLine():
            Line((-108.25, 18), (-108.25, 16.998484531))
            ThreePointArc((-108.25, 16.998484531), (-107.2030274897, 14.9813552876), (-105.3713498865, 13.6360229941))
            ThreePointArc((-105.3713498865, 13.6360229941), (-105.0654322265, 15.8214238003), (-104.7141943578, 18))
            Line((-104.7141943578, 18), (-108.25, 18))
        make_face()
        with BuildLine():
            ThreePointArc((-102.8993196823, 13.2586767409), (-102.5653728597, 15.6335149645), (-102.176624039, 18))
            Line((-102.176624039, 18), (-104.7141943578, 18))
            ThreePointArc((-104.7141943578, 18), (-105.0654322265, 15.8214238003), (-105.3713498865, 13.6360229941))
            ThreePointArc((-105.3713498865, 13.6360229941), (-104.1593059935, 13.2903122594), (-102.8993196823, 13.2586767409))
        make_face()
        with BuildLine():
            ThreePointArc((-105.3713498865, 13.6360229941), (-107.2030274897, 14.9813552876), (-108.25, 16.998484531))
            Line((-108.25, 16.998484531), (-108.25, 0))
            Line((-108.25, 0), (-106.25, 0))
            ThreePointArc((-106.25, 0), (-106.0301099345, 6.8321509995), (-105.3713498865, 13.6360229941))
        make_face()
        with BuildLine():
            Line((-101.75, 0), (-101.75, 13.5148396684))
            ThreePointArc((-101.75, 13.5148396684), (-102.3170925893, 13.3528064086), (-102.8993196823, 13.2586767409))
            ThreePointArc((-102.8993196823, 13.2586767409), (-103.5371115037, 6.6429693271), (-103.75, 0))
            Line((-103.75, 0), (-101.75, 0))
        make_face()
        with BuildLine():
            ThreePointArc((-102.8993196823, 13.2586767409), (-102.3170925893, 13.3528064086), (-101.75, 13.5148396684))
            Line((-101.75, 13.5148396684), (-101.75, 18))
            Line((-101.75, 18), (-102.176624039, 18))
            ThreePointArc((-102.176624039, 18), (-102.5653728597, 15.6335149645), (-102.8993196823, 13.2586767409))
        make_face()
        with BuildLine():
            ThreePointArc((-103.75, 0), (-103.5371115037, 6.6429693271), (-102.8993196823, 13.2586767409))
            ThreePointArc((-102.8993196823, 13.2586767409), (-104.1593059935, 13.2903122594), (-105.3713498865, 13.6360229941))
            ThreePointArc((-105.3713498865, 13.6360229941), (-106.0301099345, 6.8321509995), (-106.25, 0))
            Line((-106.25, 0), (-103.75, 0))
        make_face()
    extrude(amount=F1_DEPTH)

    # F2
    with Locations(Plane(origin=(0, 0, 0), x_dir=(1, 0, 0), z_dir=(0, 1, 0))):
        with Locations((-103.4048140663, -18.233058655), (-98.6677251825, -35.9121150492), (-90.9326673974, -52.5), (-80.4346665275, -67.4926990171), (-67.4926990171, -80.4346665275), (-52.5, -90.9326673974), (-35.9121150492, -98.6677251825), (-18.233058655, -103.4048140663)):
            Hole(F2_D / 2, depth=F2_DEPTH)
            with Locations((0, 0, -(F2_DEPTH + F2_TIP / 2))):  # 118° drill point
                Cone(0, F2_D / 2, F2_TIP, mode=Mode.SUBTRACT)

    # F0 (on Front) → F3 (join)
    with BuildSketch(Plane.XZ):
        with BuildLine():
            ThreePointArc((-102.8993196823, 13.2586767409), (-102.3170925893, 13.3528064086), (-101.75, 13.5148396684))
            Line((-101.75, 13.5148396684), (-101.75, 18))
            Line((-101.75, 18), (-102.176624039, 18))
            ThreePointArc((-102.176624039, 18), (-102.5653728597, 15.6335149645), (-102.8993196823, 13.2586767409))
        make_face()
        with BuildLine():
            ThreePointArc((-102.8993196823, 13.2586767409), (-102.5653728597, 15.6335149645), (-102.176624039, 18))
            Line((-102.176624039, 18), (-104.7141943578, 18))
            ThreePointArc((-104.7141943578, 18), (-105.0654322265, 15.8214238003), (-105.3713498865, 13.6360229941))
            ThreePointArc((-105.3713498865, 13.6360229941), (-104.1593059935, 13.2903122594), (-102.8993196823, 13.2586767409))
        make_face()
        with BuildLine():
            Line((-108.25, 18), (-108.25, 16.998484531))
            ThreePointArc((-108.25, 16.998484531), (-107.2030274897, 14.9813552876), (-105.3713498865, 13.6360229941))
            ThreePointArc((-105.3713498865, 13.6360229941), (-105.0654322265, 15.8214238003), (-104.7141943578, 18))
            Line((-104.7141943578, 18), (-108.25, 18))
        make_face()
        with BuildLine():
            ThreePointArc((-105.3713498865, 13.6360229941), (-107.2030274897, 14.9813552876), (-108.25, 16.998484531))
            Line((-108.25, 16.998484531), (-108.25, 0))
            Line((-108.25, 0), (-106.25, 0))
            ThreePointArc((-106.25, 0), (-106.0301099345, 6.8321509995), (-105.3713498865, 13.6360229941))
        make_face()
        with BuildLine():
            ThreePointArc((-103.75, 0), (-103.5371115037, 6.6429693271), (-102.8993196823, 13.2586767409))
            ThreePointArc((-102.8993196823, 13.2586767409), (-104.1593059935, 13.2903122594), (-105.3713498865, 13.6360229941))
            ThreePointArc((-105.3713498865, 13.6360229941), (-106.0301099345, 6.8321509995), (-106.25, 0))
            Line((-106.25, 0), (-103.75, 0))
        make_face()
        with BuildLine():
            Line((-101.75, 0), (-101.75, 13.5148396684))
            ThreePointArc((-101.75, 13.5148396684), (-102.3170925893, 13.3528064086), (-102.8993196823, 13.2586767409))
            ThreePointArc((-102.8993196823, 13.2586767409), (-103.5371115037, 6.6429693271), (-103.75, 0))
            Line((-103.75, 0), (-101.75, 0))
        make_face()
    extrude(amount=F3_DEPTH)

    # F4
    with Locations(Plane(origin=(0, 0, 0), x_dir=(1, 0, 0), z_dir=(0, 1, 0))):
        with Locations((-103.4048140663, -18.233058655)):
            Hole(F4_D / 2, depth=F4_DEPTH)
            with Locations((0, 0, -(F4_DEPTH + F4_TIP / 2))):  # 118° drill point
                Cone(0, F4_D / 2, F4_TIP, mode=Mode.SUBTRACT)


solid = f1.part
